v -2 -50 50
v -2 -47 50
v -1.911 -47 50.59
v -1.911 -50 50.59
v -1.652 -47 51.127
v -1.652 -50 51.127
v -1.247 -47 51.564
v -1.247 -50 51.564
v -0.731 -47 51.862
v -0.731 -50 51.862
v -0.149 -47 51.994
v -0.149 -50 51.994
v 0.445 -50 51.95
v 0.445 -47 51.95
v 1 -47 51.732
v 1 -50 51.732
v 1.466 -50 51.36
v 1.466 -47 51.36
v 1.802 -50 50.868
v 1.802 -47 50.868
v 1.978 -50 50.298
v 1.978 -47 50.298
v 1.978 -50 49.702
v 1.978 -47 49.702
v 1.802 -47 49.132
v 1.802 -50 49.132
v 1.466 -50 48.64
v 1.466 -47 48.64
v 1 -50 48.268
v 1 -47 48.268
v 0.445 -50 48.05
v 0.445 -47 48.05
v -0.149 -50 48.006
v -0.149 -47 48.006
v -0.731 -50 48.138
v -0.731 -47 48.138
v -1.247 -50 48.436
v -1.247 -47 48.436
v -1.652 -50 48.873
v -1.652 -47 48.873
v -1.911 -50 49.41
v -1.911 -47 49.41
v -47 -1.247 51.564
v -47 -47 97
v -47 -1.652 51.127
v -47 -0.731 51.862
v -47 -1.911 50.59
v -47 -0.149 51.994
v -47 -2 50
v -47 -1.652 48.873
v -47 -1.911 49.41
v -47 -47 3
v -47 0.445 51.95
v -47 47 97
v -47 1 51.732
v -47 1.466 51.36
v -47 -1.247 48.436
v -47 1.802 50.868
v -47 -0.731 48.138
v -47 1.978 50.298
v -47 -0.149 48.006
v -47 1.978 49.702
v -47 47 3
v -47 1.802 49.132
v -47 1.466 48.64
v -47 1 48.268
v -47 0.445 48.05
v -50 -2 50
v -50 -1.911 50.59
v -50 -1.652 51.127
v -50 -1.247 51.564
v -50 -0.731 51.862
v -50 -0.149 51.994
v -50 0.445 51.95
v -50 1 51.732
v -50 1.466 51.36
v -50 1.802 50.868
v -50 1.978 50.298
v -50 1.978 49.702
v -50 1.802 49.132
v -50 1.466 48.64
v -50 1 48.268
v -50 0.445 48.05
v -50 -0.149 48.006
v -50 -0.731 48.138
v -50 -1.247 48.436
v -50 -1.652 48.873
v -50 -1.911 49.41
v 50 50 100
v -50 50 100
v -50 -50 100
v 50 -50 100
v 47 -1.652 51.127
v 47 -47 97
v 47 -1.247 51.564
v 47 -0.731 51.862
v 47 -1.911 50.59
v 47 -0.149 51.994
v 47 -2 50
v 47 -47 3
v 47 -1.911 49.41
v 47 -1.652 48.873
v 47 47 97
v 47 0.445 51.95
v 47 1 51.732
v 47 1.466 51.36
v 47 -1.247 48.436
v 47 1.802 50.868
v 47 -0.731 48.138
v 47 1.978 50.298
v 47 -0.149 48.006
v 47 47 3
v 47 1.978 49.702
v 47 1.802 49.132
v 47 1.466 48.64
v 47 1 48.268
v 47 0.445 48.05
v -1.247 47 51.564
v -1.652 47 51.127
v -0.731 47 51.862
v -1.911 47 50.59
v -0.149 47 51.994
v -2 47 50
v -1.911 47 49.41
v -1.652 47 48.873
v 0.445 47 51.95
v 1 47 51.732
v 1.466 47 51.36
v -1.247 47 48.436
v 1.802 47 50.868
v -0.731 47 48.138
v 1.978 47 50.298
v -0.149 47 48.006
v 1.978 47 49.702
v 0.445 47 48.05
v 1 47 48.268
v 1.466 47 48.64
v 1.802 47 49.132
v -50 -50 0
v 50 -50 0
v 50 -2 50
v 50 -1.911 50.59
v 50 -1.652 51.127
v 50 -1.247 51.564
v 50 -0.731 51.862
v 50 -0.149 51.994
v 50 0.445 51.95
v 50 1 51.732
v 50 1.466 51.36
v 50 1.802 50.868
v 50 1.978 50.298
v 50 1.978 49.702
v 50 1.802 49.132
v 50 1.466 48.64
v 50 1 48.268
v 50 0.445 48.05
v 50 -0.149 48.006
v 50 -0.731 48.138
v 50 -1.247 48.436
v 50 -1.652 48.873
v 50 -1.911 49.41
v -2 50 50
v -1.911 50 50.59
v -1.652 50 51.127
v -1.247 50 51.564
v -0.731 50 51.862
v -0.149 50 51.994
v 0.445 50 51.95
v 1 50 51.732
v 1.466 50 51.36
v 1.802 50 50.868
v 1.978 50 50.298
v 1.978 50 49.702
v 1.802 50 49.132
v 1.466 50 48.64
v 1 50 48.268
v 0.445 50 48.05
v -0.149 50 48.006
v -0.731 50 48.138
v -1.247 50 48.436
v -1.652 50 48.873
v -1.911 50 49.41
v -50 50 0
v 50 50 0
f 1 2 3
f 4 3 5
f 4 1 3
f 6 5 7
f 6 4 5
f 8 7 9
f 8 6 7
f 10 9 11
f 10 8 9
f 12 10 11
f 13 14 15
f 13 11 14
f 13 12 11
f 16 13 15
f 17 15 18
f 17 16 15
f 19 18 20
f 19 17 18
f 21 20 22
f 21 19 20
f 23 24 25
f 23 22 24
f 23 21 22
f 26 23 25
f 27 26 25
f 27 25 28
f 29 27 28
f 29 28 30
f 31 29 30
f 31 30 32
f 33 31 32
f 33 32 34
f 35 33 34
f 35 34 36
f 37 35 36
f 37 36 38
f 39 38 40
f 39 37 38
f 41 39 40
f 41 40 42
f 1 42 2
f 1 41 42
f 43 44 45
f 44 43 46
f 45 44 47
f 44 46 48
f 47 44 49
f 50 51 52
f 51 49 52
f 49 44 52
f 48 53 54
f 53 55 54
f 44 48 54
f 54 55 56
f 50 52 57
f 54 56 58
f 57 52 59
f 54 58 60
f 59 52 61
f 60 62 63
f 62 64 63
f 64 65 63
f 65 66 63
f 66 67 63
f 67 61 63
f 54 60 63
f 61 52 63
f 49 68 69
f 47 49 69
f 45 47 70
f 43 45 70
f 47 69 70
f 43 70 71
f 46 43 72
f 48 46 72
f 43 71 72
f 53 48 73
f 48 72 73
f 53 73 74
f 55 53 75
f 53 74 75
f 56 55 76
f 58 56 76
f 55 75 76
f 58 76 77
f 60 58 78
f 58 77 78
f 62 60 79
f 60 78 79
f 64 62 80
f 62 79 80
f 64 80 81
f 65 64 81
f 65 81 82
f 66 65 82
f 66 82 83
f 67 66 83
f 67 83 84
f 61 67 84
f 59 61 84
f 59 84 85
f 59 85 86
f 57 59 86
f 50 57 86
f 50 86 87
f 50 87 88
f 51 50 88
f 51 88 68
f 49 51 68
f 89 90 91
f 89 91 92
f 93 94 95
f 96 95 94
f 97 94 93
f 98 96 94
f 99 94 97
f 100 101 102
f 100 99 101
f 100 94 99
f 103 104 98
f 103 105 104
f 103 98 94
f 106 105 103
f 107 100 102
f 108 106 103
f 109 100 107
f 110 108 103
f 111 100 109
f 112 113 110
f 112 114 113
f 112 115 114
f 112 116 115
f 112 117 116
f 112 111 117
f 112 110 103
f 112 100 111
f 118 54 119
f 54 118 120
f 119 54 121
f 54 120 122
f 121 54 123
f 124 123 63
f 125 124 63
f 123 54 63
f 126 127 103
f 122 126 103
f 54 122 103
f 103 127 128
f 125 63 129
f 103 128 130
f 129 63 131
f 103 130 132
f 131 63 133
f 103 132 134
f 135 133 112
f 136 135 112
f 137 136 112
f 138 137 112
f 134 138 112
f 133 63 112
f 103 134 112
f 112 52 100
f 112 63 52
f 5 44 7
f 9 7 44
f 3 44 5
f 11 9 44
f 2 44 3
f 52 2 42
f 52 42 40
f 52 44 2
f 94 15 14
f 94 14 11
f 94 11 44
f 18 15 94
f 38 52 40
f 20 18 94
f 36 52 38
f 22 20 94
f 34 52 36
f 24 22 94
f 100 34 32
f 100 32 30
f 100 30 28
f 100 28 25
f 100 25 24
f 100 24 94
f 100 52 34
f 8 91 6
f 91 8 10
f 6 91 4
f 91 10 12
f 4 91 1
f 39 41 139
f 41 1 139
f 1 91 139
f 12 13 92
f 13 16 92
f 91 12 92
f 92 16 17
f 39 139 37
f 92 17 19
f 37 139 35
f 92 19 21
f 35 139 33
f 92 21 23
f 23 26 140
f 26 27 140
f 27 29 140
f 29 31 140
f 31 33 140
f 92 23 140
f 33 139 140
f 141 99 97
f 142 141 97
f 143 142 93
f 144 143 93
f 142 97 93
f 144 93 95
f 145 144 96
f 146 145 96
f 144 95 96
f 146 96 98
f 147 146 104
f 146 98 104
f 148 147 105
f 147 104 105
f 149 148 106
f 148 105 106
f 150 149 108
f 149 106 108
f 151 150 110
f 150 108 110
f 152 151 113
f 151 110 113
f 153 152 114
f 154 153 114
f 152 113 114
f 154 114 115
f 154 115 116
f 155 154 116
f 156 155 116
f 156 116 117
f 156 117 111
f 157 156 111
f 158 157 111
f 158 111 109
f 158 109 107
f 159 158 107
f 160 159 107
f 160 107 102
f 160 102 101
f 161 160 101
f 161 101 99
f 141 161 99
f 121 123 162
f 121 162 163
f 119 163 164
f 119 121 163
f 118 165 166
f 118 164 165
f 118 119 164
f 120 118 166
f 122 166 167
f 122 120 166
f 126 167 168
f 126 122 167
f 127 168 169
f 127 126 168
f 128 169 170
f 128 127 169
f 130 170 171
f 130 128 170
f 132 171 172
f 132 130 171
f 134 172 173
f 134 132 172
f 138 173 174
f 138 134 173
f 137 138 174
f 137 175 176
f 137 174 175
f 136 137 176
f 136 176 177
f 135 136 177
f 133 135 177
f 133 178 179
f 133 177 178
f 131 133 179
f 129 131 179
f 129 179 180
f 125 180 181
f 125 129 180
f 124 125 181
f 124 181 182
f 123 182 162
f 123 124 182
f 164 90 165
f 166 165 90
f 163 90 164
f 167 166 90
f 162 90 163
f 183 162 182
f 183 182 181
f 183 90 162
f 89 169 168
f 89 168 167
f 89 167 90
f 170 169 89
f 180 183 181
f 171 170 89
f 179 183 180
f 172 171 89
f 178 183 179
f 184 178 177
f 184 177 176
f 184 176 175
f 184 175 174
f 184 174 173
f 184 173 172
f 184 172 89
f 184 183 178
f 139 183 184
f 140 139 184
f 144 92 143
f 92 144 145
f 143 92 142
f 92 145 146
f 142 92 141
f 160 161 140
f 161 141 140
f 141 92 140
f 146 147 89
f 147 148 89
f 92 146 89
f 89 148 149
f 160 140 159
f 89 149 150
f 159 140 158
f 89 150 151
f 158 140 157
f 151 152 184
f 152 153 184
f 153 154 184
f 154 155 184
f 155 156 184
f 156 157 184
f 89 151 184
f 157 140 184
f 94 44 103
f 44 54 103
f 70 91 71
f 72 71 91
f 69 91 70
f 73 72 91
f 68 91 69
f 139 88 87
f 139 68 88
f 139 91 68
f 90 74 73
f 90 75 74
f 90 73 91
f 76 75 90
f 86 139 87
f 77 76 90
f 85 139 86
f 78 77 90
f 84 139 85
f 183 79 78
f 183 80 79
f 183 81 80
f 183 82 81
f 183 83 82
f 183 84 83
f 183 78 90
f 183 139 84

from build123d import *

# Parameters (mm, degrees)
F0_W     = 100
F0_H     = 100
F1_DEPTH = 100
F2_T     = -3
F3_R     = 2
F4_DEPTH = 100.001


# Not quite as in the source:
# - a pattern or mirror of a feature is missing from the dataset's text; its kind, count and spacing are read off the source's solid


with BuildPart() as f1:
    # F0 (on Top) → F1 (new body)
    with BuildSketch(Plane.XY):
        Rectangle(F0_W, F0_H)
    extrude(amount=F1_DEPTH)

    # F2 (hollow: no face is removed)
    offset(amount=F2_T, mode=Mode.SUBTRACT)

    # F3 (on face) → F4 (cut, through all)
    with BuildSketch(Plane(origin=(-50, 0, 0), x_dir=(0, -1, 0), z_dir=(-1, 0, 0))):
        with Locations((0, 50)):
            Circle(F3_R)
    f4 = extrude(amount=-F4_DEPTH, mode=Mode.SUBTRACT)

    # F4_copies: F4 across plane
    add(f4.mirror(Plane(origin=(0, 0, 0), x_dir=(0.7071067812, 0.7071067812, 0), z_dir=(-0.7071067812, 0.7071067812, 0))), mode=Mode.SUBTRACT)


solid = f1.part
